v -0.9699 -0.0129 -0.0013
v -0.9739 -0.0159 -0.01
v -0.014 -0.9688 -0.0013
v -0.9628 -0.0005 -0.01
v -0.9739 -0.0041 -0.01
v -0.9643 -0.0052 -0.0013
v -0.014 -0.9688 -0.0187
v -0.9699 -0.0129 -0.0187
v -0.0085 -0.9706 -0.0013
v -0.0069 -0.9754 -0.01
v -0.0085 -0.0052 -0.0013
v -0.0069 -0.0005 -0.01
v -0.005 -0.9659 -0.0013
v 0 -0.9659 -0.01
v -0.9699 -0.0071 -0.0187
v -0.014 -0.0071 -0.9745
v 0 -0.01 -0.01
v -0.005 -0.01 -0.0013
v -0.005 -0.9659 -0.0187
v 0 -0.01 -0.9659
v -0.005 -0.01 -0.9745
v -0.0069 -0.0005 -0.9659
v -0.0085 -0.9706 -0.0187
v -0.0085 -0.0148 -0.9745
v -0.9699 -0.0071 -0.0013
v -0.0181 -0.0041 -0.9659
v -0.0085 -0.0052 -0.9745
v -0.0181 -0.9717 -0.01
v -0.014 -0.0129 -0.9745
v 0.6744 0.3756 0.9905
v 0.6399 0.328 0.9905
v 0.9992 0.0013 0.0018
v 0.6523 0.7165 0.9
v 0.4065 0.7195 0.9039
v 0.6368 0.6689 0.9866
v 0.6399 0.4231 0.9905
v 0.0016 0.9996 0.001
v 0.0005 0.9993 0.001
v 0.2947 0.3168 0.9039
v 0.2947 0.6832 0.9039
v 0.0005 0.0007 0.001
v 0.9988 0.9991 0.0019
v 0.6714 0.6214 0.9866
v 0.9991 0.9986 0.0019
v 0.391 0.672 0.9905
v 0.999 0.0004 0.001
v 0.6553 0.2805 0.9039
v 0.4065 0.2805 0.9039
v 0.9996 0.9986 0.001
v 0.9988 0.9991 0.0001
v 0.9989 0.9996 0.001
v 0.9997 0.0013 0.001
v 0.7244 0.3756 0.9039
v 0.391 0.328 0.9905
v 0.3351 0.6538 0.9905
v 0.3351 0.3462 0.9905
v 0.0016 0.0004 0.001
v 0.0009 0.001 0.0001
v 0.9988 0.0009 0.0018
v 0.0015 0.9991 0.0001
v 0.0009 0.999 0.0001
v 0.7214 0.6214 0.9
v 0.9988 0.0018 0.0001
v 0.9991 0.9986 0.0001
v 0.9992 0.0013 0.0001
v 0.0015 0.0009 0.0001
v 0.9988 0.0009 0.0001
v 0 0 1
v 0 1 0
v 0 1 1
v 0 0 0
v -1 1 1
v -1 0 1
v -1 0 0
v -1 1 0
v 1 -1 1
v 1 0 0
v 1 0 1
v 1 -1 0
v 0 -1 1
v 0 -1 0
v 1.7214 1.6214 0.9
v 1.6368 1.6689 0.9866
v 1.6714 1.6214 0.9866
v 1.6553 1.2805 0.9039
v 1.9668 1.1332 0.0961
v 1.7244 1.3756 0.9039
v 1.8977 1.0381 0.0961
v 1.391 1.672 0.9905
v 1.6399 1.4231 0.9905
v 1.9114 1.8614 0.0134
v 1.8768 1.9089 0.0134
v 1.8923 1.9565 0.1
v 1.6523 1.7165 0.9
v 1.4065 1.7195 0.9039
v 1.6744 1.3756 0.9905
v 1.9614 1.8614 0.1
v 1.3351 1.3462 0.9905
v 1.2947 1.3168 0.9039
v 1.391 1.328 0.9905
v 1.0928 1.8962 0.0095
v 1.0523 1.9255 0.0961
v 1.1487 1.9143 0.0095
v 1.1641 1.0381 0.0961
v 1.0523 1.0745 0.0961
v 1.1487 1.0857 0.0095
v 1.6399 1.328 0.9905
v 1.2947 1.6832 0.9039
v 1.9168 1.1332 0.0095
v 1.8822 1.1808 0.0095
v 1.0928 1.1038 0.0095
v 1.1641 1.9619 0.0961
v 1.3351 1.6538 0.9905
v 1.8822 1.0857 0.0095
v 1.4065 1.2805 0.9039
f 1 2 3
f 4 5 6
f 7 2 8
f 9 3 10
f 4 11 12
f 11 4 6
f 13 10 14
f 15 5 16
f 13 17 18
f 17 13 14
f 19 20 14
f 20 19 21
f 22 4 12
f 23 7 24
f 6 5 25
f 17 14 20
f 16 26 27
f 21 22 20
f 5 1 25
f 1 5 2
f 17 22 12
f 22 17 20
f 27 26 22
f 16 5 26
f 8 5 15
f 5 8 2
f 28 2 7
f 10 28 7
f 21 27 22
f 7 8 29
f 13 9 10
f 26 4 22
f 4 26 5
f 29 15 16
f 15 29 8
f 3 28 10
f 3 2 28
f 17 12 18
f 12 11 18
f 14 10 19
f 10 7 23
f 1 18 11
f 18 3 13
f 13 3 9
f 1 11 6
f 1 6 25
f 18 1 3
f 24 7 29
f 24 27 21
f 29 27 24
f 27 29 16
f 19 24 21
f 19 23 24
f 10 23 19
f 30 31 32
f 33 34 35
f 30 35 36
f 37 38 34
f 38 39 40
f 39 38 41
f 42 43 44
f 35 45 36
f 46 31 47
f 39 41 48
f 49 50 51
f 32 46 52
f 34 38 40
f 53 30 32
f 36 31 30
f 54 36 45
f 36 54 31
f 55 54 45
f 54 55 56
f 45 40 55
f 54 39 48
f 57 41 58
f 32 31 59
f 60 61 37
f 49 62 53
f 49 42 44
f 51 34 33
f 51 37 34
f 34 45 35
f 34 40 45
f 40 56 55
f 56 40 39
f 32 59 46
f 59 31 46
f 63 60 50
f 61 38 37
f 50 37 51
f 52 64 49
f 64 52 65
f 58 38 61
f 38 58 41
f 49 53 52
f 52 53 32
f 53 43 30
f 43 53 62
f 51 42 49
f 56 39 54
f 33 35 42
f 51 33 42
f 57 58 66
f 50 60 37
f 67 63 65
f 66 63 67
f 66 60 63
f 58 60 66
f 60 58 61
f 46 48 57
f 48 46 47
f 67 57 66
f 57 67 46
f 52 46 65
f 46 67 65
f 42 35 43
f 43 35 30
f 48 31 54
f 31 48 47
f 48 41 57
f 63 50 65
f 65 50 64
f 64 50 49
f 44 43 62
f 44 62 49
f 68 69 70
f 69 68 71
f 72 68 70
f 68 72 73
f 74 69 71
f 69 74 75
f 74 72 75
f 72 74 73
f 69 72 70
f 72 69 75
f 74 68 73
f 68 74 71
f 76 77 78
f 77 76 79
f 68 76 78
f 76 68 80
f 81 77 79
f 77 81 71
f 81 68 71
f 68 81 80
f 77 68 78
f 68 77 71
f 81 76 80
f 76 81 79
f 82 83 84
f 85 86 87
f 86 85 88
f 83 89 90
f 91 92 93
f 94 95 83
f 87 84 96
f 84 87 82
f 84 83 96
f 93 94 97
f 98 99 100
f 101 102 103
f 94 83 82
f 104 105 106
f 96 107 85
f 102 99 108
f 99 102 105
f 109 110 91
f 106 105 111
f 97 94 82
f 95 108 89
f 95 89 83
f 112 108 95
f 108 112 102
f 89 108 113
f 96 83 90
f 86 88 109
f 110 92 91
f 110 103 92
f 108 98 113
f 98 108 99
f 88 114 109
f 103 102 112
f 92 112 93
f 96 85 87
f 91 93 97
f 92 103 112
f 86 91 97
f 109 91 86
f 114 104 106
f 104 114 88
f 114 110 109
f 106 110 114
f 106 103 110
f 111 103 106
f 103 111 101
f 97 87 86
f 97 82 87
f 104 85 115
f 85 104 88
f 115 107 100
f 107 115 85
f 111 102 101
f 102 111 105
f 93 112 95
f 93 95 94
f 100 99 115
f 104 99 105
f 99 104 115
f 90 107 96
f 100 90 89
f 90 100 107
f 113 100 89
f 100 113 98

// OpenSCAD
module rounded_corner(
    point_left,
    point_center,
    point_right,
    r, // radius of circle at corner
    h
) {
    A_=point_left-point_center;
    B_=point_right-point_center;
    A=A_/norm(A_);
    B=B_/norm(B_);
    M=(A+B)*0.5;
    a=r/norm(M-(M*B)/(B*B)*B);
    //echo(a);
    translate(point_center)
        translate(a*M)
            cylinder(r=r,h=h); 
    //polygon([point_left,point_center,point_right]);
}

module rounded_convex_polygon(
    points,
    r,
    h
)
{
    points_=concat([points[len(points)-1]],points,[points[0]]);
    hull () {
        for (i=[0:len(points_)-3]) {
            rounded_corner(points_[i],points_[i+1],points_[i+2],r,h);
        }
    }
}

function vadd(points,point)=[for(p=points)p+point];
function vmulc(points,c)=[for(p=points)p*c];
function sum(list, idx = 0, result = 0) = 
	idx >= len(list) ? result : sum(list, idx + 1, result + list[idx]);
function midpoint(points)=sum(points,result=[0,0,0])/len(points);
function normalize(p)=p/norm(p);
function normalize_l(ps)=[for(p=ps)normalize(p)];
// The projection of A onto B
function proj_v(A,B)=(A*B)/(B*B)*B;
// vectorized indexing
function index_v(p,i)=[for(i_=i)p[i_]];

// returns the point of the sphere sitting in the corner desribed by these
// points
// NOTE: If there's not enough "room" inside of the polygon, the sphere will
// protrude, there's nothing this can do about it
// TODO: Not sure if this works for more than 3 points
// NOTE: If the cross product between the first 2 points (or any points really)
// is [0,0,0], then the result is undefined (divide by 0 basically).
function rounded_3d_inside_corner(
    center, // the point the bisector exits from
    points, // the points that are connected to the center point
    r, // radius of circle at corner
)=
let(
   points_=normalize_l(vadd(points,-center)),
   M=midpoint(points_),
   N=cross(points_[0],points_[1]),
   a=r/norm(M-(M-proj_v(M,N)))
   //why this doesn't work, I don't know
   //proj_v(M,points_[0])+proj_v(M,points_[1])), shouldn't it be the same as
   //projecting onto the plane spanned by points_[0] and points_[1] ?
)a*M+center;
//sum(vmulc(points_,r),result=[0,0,0])+center;//a*M+center;

// Gives a bunch of spheres describing the outside of the convex hull
// representing a rounded polyhedron
// To make into a polyhedron, simply surround with hull () { ... }
module rounded_convex_set_vertices(
    points, // the points in the polygon
// a list of lists containing indices of the points each point is connected to by an edge
// i.e., the list at the 0th index lists the indices of the points the 0th point
// is connected to
    point_idx,
    r, // radii of circles at corner
    //TODO: Not sure how correct this is if more than 3 edges meet at a vertex
){
        for (i=[0:len(points)-1]) {
            echo(index_v(points,point_idx[i]));
            translate(rounded_3d_inside_corner(points[i],index_v(points,point_idx[i]),r[i]))
                sphere(r[i]);
        }
}

module rounded_convex_polyhedron(
    points, // the points in the polygon
// a list of lists containing indices of the points each point is connected to by an edge
// i.e., the list at the 0th index lists the indices of the points the 0th point
// is connected to
    point_idx,
    r, // radii of circles at corner
    //TODO: Not sure how correct this is if more than 3 edges meet at a vertex
) {
    hull () {
        rounded_convex_set_vertices(points,point_idx,r);
    }
}

module rounded_convex_polyhedron_c(
    points, // the points in the polygon
// a list of lists containing indices of the points each point is connected to by an edge
// i.e., the list at the 0th index lists the indices of the points the 0th point
// is connected to
    point_idx,
    r, // radius of circles at corner
) {
    rounded_convex_polyhedron(points,point_idx,[for(i=[1:len(points)])r]);
}

// Gives a polygon with the rounded polyhedron subtracted out of it
// TODO: This isn't tested, may never work.
module inverse_rounded_convex_polyhedron( points, point_idx, r)
{
   difference () { 
        rounded_convex_polyhedron_c(points,point_idx,1e-3); 
        scale([1.01,1.01,1.01]) rounded_convex_polyhedron(points,point_idx,r);
   }
}

//$fn=10;
//for (i=[1:5]) {
//    rounded_convex_polygon([[1,6],[1,1],[2,1],[3,4]],i*0.05,i);
//}
//tetra_points=[[1,1,1],[1,-1,-1],[-1,1,-1],[-1,-1,2]];
tetra_points=[[0,0,0],[-1,0,0],[0,-1,0],[0,0,-1]];
        rounded_convex_polyhedron_c(
                tetra_points,
                [[1,2,3],[0,2,3],[0,1,3],[0,1,2]],
                0.01);

box_points=[[0,0,0],[0,0,1],[0,1,0],[0,1,1],[1,0,0],[1,0,1],[1,1,0],[1,1,1]];
*rounded_convex_polyhedron_c(
        vmulc(box_points,1),
        [[1,2,4],[0,3,5],[0,3,6],[2,1,7],[0,5,6],[4,7,1],[4,2,7],[3,5,6]],
        0.1);

top_s=0.3;
trap_points=[[0,0,0],[top_s,top_s,1],[0,1,0],[top_s,1-top_s,1],[1,0,0],[1-top_s,top_s,1],[1,1,0],[1-top_s,1-top_s,1]];
rounded_convex_polyhedron(
        vmulc(trap_points,1),
        [[1,2,4],[0,3,5],[0,3,6],[2,1,7],[0,5,6],[4,7,1],[4,2,7],[3,5,6]],
        [for(i=[0:len(trap_points)-1])trap_points[i][2]==1?0.1:0.001]);
polyhedron(
        [[0,0,0],[0,0,1],[1,0,0],[1,0,1],[0,top_s,1],[1,top_s,1]],
        faces=[[0,1,3,2],[0,1,4],[2,3,5],[0,2,5,4],[1,3,5,4]]);
translate([-1,0,0]) cube([1,1,1]);
translate([0,-1,0]) cube([1,1,1]);
translate([1,1,0])
rounded_convex_polyhedron_c(
        vmulc(trap_points,1),
        [[1,2,4],[0,3,5],[0,3,6],[2,1,7],[0,5,6],[4,7,1],[4,2,7],[3,5,6]],
        0.1);
/*
translate([1,0,0])
trap_points_i=[[0,0,0],[top_s-1,top_s,1],[0,1,0],[top_s-1,1-top_s,1],[1,0,0],[1-top_s,top_s,1],[1,1,0],[1-top_s,1-top_s,1]];
inverse_rounded_convex_polyhedron(trap_points,
        [[1,2,4],[0,3,5],[0,3,6],[2,1,7],[0,5,6],[4,7,1],[4,2,7],[3,5,6]],
        [for(i=[0:len(trap_points)-1])trap_points[i][2]==0?0.1:0.001]);
*/
